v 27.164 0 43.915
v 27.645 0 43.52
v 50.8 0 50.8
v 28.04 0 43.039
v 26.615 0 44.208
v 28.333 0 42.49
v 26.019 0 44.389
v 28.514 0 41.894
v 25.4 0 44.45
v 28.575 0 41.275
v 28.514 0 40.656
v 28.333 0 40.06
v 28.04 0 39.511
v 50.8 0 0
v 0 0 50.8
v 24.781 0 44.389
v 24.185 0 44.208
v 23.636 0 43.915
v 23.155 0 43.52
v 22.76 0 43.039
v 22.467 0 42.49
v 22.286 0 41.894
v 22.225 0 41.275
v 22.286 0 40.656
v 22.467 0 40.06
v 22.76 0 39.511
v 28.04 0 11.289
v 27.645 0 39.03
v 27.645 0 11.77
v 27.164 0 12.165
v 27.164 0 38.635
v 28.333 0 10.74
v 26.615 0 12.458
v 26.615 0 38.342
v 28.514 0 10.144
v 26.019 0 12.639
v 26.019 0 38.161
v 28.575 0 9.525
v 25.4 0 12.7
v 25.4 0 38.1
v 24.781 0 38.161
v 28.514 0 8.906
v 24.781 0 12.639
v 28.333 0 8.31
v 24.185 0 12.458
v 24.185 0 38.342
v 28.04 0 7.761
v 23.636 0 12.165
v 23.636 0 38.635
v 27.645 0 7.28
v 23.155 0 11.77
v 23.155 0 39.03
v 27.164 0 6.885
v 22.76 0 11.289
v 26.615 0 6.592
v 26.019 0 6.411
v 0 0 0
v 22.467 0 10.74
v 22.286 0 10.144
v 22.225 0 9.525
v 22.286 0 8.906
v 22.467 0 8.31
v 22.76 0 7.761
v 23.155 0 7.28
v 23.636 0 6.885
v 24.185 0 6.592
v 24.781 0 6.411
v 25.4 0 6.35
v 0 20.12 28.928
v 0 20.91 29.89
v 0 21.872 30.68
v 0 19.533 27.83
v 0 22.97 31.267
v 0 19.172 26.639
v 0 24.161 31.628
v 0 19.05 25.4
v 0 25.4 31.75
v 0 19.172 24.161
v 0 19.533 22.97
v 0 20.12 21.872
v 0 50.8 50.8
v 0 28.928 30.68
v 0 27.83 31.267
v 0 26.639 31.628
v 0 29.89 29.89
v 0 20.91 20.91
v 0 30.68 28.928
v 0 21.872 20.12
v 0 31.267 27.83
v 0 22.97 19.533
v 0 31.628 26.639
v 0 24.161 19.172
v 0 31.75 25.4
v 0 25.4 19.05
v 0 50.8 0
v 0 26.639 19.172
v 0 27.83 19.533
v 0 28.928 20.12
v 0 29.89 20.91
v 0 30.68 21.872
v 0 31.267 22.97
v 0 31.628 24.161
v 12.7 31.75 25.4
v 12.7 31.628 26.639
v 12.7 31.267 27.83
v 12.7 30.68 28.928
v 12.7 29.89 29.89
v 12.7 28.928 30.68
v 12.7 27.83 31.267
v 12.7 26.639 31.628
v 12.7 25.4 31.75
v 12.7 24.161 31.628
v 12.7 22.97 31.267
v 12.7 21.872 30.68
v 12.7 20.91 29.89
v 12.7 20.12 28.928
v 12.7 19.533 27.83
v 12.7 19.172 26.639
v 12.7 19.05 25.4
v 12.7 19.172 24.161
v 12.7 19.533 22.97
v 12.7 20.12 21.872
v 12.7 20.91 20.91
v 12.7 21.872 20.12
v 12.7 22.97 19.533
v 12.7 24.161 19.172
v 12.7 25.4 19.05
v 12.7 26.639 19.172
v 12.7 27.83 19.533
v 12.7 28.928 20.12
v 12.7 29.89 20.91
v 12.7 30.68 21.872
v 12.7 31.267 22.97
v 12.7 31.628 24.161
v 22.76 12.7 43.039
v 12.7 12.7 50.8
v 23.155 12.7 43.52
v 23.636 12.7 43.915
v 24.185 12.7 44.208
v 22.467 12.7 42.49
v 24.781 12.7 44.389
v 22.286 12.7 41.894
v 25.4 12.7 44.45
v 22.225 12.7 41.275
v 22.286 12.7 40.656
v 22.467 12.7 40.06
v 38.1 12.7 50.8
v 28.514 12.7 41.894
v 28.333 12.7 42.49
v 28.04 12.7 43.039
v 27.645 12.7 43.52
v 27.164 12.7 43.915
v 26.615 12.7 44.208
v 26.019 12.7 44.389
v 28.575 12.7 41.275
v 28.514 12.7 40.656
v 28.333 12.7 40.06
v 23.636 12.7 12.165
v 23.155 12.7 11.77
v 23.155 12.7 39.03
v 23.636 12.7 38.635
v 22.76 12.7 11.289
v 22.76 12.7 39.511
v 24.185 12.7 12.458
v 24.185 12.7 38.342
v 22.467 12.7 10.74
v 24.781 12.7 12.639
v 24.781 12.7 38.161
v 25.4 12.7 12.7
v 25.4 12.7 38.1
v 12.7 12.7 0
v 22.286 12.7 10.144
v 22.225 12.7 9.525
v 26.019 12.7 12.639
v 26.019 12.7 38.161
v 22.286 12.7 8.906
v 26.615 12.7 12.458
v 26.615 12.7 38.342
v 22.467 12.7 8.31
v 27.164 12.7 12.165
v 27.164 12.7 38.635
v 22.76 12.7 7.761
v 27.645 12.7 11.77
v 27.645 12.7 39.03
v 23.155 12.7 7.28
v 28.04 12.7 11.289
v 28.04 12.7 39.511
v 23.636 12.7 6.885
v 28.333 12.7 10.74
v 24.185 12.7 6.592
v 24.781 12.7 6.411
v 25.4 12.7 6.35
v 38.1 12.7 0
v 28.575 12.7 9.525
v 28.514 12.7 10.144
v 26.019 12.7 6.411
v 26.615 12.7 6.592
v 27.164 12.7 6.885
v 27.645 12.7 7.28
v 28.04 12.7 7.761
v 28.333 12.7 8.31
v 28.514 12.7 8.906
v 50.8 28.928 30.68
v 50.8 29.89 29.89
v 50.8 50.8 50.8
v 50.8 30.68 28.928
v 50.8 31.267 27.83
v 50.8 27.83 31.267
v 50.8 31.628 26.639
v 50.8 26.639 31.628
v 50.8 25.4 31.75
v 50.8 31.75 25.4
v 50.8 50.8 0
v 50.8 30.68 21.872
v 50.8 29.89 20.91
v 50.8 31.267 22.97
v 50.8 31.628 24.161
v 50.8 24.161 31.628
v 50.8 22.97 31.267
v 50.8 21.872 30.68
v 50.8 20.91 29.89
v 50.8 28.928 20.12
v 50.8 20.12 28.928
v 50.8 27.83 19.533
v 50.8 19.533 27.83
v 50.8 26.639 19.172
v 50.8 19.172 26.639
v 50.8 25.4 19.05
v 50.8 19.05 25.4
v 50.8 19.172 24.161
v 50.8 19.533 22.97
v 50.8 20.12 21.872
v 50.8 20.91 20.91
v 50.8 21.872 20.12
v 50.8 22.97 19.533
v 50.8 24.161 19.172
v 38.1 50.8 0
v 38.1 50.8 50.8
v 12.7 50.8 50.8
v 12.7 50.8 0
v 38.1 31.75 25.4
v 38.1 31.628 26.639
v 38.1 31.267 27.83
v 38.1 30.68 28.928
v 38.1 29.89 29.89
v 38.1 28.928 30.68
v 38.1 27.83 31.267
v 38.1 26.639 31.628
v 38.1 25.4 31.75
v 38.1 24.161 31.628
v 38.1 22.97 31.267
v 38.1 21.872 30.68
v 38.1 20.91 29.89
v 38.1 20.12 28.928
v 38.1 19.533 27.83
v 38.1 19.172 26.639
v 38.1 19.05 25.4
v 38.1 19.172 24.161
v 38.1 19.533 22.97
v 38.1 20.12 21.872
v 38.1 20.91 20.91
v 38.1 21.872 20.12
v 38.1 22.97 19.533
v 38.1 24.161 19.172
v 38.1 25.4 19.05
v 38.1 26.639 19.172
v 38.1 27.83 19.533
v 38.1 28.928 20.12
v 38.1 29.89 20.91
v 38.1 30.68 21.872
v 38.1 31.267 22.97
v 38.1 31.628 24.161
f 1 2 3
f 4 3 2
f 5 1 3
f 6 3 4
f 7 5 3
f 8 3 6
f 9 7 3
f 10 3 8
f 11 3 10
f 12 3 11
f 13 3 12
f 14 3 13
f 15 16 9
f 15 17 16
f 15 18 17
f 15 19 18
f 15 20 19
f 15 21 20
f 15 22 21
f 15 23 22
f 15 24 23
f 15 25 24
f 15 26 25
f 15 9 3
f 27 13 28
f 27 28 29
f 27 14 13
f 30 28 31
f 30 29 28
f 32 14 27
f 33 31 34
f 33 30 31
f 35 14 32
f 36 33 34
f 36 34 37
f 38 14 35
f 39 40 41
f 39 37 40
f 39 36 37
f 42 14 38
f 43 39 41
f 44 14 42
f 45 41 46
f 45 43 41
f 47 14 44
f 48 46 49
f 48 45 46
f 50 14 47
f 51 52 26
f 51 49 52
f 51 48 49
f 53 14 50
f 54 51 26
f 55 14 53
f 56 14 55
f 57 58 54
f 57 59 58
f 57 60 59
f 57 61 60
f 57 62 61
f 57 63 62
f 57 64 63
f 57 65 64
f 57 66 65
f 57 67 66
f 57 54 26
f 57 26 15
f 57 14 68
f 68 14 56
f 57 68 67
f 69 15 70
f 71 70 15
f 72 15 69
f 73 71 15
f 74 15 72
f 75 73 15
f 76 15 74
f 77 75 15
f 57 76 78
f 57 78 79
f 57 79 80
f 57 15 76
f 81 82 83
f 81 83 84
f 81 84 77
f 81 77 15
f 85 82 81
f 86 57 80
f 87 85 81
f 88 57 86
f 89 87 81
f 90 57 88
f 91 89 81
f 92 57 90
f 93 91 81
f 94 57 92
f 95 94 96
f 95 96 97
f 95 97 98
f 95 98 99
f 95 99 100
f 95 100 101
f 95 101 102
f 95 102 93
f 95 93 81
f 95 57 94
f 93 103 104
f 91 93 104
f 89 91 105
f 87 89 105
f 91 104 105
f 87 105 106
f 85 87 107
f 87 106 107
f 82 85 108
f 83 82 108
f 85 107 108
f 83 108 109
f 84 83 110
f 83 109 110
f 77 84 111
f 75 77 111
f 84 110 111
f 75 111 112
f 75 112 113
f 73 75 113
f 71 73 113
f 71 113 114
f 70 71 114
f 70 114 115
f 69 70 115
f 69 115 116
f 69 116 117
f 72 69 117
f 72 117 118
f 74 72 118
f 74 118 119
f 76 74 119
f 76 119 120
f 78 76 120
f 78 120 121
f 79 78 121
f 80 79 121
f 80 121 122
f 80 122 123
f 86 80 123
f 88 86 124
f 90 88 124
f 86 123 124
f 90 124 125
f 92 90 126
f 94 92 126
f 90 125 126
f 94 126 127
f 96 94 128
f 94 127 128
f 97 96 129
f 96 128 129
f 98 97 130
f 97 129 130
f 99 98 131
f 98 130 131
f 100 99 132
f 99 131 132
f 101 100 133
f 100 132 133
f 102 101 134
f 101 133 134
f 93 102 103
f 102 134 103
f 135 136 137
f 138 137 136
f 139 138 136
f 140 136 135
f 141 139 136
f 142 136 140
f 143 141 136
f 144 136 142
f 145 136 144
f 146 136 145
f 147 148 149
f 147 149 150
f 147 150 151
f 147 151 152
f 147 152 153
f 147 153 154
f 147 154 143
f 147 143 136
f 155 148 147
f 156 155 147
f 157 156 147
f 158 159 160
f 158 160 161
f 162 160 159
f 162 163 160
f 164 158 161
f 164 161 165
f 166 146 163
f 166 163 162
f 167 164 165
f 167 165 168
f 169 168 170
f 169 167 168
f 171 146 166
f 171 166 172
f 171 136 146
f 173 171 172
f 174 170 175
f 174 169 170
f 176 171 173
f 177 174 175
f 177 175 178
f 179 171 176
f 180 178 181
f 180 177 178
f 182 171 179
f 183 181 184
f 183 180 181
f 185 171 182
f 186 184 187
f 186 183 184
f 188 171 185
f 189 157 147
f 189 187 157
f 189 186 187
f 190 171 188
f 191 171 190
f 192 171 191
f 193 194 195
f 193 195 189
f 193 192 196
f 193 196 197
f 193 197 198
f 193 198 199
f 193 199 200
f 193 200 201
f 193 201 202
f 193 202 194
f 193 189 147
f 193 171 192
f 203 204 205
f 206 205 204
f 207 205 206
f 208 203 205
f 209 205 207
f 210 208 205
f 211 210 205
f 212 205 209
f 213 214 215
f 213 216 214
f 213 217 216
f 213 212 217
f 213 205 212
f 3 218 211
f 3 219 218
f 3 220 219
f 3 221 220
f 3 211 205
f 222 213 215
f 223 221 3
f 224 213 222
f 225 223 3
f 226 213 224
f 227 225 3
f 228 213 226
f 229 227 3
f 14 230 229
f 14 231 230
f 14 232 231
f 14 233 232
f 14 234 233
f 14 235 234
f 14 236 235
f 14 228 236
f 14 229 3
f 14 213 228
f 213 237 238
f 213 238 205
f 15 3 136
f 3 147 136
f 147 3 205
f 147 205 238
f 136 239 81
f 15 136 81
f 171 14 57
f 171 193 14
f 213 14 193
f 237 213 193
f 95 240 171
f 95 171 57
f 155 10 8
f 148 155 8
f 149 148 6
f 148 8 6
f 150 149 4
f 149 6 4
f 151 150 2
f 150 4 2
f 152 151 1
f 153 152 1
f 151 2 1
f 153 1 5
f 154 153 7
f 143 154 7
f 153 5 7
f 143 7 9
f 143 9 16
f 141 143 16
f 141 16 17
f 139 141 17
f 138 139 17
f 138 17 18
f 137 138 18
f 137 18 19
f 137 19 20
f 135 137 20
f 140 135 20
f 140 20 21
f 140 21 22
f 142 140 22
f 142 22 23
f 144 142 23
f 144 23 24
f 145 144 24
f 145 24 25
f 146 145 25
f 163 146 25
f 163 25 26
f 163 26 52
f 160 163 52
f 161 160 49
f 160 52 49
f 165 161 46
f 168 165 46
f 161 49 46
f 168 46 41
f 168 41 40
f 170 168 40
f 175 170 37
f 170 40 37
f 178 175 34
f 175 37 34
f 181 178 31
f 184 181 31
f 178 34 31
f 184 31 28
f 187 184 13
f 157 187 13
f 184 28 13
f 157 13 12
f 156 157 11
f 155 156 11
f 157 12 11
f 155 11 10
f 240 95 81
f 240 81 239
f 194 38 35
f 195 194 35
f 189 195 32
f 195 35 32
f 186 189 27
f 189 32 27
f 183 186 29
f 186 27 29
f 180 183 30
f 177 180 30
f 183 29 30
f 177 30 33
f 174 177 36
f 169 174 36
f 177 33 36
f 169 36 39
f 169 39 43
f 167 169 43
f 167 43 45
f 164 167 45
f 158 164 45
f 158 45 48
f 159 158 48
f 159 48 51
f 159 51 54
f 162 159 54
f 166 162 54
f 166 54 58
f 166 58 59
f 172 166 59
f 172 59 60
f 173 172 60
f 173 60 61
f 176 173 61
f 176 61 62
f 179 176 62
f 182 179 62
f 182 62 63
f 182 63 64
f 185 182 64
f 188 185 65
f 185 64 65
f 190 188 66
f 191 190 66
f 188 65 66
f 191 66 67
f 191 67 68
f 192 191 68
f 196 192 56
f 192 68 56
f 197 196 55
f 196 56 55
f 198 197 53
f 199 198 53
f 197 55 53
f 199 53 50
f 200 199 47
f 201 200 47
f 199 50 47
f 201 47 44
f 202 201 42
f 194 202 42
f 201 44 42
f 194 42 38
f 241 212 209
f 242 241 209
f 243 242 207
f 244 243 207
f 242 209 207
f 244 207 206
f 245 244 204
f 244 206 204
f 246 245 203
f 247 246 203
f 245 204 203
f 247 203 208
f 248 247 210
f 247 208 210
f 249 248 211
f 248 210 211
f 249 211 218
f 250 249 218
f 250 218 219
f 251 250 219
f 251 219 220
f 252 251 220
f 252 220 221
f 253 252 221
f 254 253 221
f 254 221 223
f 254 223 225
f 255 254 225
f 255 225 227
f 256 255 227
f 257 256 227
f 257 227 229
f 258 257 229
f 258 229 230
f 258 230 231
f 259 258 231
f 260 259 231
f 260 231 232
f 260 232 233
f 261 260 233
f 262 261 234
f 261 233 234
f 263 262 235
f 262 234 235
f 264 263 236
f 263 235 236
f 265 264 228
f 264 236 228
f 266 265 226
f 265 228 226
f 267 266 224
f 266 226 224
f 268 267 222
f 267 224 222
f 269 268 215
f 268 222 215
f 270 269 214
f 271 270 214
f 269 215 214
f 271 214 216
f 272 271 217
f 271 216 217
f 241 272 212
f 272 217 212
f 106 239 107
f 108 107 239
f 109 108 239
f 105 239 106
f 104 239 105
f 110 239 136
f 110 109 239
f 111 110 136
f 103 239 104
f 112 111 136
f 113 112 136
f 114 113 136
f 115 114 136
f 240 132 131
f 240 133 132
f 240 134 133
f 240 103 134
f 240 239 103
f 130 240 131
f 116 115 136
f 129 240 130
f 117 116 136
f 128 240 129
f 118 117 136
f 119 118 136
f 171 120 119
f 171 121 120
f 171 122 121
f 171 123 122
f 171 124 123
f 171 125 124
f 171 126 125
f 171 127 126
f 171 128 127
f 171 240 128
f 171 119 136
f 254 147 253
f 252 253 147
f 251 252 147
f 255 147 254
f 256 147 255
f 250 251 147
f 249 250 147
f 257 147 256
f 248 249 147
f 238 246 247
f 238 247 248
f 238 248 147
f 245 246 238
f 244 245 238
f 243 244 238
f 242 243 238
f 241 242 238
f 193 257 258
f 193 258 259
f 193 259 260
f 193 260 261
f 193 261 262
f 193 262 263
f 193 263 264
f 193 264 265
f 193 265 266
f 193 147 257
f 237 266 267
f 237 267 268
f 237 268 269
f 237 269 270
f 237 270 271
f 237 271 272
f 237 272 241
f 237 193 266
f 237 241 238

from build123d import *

# Parameters (mm, degrees)
EXTRUDE1_DEPTH     = 50.8
SKETCH2_R          = 3.175
CUT_EXTRUDE1_DEPTH = 88.988181024
SKETCH3_R          = 6.35
CUT_EXTRUDE2_DEPTH = 88.988181024


with BuildPart() as part:
    # Sketch1 → Extrude1 (new body)
    with BuildSketch(Plane.XY):
        Polygon((0, 0), (0, 50.8), (12.7, 50.8), (12.7, 12.7), (38.1, 12.7), (38.1, 50.8), (50.8, 50.8), (50.8, 0), align=None)
    extrude(amount=EXTRUDE1_DEPTH)

    # Sketch2 → Cut-Extrude1 (cut, through all)
    with BuildSketch(Plane.XZ):
        with Locations((25.4, 41.275)):
            Circle(SKETCH2_R)
        with Locations((25.4, 9.525)):
            Circle(SKETCH2_R)
    extrude(amount=-CUT_EXTRUDE1_DEPTH, mode=Mode.SUBTRACT)

    # Sketch3 → Cut-Extrude2 (cut, through all)
    with BuildSketch(Plane(origin=(50.8, 0, 0), x_dir=(0, 0, -1), z_dir=(1, 0, 0))):
        with Locations(Location((-25.4, 25.4, 0), (0, 0, 90))):
            Circle(SKETCH3_R)
    extrude(amount=-CUT_EXTRUDE2_DEPTH, mode=Mode.SUBTRACT)


solid = part.part
